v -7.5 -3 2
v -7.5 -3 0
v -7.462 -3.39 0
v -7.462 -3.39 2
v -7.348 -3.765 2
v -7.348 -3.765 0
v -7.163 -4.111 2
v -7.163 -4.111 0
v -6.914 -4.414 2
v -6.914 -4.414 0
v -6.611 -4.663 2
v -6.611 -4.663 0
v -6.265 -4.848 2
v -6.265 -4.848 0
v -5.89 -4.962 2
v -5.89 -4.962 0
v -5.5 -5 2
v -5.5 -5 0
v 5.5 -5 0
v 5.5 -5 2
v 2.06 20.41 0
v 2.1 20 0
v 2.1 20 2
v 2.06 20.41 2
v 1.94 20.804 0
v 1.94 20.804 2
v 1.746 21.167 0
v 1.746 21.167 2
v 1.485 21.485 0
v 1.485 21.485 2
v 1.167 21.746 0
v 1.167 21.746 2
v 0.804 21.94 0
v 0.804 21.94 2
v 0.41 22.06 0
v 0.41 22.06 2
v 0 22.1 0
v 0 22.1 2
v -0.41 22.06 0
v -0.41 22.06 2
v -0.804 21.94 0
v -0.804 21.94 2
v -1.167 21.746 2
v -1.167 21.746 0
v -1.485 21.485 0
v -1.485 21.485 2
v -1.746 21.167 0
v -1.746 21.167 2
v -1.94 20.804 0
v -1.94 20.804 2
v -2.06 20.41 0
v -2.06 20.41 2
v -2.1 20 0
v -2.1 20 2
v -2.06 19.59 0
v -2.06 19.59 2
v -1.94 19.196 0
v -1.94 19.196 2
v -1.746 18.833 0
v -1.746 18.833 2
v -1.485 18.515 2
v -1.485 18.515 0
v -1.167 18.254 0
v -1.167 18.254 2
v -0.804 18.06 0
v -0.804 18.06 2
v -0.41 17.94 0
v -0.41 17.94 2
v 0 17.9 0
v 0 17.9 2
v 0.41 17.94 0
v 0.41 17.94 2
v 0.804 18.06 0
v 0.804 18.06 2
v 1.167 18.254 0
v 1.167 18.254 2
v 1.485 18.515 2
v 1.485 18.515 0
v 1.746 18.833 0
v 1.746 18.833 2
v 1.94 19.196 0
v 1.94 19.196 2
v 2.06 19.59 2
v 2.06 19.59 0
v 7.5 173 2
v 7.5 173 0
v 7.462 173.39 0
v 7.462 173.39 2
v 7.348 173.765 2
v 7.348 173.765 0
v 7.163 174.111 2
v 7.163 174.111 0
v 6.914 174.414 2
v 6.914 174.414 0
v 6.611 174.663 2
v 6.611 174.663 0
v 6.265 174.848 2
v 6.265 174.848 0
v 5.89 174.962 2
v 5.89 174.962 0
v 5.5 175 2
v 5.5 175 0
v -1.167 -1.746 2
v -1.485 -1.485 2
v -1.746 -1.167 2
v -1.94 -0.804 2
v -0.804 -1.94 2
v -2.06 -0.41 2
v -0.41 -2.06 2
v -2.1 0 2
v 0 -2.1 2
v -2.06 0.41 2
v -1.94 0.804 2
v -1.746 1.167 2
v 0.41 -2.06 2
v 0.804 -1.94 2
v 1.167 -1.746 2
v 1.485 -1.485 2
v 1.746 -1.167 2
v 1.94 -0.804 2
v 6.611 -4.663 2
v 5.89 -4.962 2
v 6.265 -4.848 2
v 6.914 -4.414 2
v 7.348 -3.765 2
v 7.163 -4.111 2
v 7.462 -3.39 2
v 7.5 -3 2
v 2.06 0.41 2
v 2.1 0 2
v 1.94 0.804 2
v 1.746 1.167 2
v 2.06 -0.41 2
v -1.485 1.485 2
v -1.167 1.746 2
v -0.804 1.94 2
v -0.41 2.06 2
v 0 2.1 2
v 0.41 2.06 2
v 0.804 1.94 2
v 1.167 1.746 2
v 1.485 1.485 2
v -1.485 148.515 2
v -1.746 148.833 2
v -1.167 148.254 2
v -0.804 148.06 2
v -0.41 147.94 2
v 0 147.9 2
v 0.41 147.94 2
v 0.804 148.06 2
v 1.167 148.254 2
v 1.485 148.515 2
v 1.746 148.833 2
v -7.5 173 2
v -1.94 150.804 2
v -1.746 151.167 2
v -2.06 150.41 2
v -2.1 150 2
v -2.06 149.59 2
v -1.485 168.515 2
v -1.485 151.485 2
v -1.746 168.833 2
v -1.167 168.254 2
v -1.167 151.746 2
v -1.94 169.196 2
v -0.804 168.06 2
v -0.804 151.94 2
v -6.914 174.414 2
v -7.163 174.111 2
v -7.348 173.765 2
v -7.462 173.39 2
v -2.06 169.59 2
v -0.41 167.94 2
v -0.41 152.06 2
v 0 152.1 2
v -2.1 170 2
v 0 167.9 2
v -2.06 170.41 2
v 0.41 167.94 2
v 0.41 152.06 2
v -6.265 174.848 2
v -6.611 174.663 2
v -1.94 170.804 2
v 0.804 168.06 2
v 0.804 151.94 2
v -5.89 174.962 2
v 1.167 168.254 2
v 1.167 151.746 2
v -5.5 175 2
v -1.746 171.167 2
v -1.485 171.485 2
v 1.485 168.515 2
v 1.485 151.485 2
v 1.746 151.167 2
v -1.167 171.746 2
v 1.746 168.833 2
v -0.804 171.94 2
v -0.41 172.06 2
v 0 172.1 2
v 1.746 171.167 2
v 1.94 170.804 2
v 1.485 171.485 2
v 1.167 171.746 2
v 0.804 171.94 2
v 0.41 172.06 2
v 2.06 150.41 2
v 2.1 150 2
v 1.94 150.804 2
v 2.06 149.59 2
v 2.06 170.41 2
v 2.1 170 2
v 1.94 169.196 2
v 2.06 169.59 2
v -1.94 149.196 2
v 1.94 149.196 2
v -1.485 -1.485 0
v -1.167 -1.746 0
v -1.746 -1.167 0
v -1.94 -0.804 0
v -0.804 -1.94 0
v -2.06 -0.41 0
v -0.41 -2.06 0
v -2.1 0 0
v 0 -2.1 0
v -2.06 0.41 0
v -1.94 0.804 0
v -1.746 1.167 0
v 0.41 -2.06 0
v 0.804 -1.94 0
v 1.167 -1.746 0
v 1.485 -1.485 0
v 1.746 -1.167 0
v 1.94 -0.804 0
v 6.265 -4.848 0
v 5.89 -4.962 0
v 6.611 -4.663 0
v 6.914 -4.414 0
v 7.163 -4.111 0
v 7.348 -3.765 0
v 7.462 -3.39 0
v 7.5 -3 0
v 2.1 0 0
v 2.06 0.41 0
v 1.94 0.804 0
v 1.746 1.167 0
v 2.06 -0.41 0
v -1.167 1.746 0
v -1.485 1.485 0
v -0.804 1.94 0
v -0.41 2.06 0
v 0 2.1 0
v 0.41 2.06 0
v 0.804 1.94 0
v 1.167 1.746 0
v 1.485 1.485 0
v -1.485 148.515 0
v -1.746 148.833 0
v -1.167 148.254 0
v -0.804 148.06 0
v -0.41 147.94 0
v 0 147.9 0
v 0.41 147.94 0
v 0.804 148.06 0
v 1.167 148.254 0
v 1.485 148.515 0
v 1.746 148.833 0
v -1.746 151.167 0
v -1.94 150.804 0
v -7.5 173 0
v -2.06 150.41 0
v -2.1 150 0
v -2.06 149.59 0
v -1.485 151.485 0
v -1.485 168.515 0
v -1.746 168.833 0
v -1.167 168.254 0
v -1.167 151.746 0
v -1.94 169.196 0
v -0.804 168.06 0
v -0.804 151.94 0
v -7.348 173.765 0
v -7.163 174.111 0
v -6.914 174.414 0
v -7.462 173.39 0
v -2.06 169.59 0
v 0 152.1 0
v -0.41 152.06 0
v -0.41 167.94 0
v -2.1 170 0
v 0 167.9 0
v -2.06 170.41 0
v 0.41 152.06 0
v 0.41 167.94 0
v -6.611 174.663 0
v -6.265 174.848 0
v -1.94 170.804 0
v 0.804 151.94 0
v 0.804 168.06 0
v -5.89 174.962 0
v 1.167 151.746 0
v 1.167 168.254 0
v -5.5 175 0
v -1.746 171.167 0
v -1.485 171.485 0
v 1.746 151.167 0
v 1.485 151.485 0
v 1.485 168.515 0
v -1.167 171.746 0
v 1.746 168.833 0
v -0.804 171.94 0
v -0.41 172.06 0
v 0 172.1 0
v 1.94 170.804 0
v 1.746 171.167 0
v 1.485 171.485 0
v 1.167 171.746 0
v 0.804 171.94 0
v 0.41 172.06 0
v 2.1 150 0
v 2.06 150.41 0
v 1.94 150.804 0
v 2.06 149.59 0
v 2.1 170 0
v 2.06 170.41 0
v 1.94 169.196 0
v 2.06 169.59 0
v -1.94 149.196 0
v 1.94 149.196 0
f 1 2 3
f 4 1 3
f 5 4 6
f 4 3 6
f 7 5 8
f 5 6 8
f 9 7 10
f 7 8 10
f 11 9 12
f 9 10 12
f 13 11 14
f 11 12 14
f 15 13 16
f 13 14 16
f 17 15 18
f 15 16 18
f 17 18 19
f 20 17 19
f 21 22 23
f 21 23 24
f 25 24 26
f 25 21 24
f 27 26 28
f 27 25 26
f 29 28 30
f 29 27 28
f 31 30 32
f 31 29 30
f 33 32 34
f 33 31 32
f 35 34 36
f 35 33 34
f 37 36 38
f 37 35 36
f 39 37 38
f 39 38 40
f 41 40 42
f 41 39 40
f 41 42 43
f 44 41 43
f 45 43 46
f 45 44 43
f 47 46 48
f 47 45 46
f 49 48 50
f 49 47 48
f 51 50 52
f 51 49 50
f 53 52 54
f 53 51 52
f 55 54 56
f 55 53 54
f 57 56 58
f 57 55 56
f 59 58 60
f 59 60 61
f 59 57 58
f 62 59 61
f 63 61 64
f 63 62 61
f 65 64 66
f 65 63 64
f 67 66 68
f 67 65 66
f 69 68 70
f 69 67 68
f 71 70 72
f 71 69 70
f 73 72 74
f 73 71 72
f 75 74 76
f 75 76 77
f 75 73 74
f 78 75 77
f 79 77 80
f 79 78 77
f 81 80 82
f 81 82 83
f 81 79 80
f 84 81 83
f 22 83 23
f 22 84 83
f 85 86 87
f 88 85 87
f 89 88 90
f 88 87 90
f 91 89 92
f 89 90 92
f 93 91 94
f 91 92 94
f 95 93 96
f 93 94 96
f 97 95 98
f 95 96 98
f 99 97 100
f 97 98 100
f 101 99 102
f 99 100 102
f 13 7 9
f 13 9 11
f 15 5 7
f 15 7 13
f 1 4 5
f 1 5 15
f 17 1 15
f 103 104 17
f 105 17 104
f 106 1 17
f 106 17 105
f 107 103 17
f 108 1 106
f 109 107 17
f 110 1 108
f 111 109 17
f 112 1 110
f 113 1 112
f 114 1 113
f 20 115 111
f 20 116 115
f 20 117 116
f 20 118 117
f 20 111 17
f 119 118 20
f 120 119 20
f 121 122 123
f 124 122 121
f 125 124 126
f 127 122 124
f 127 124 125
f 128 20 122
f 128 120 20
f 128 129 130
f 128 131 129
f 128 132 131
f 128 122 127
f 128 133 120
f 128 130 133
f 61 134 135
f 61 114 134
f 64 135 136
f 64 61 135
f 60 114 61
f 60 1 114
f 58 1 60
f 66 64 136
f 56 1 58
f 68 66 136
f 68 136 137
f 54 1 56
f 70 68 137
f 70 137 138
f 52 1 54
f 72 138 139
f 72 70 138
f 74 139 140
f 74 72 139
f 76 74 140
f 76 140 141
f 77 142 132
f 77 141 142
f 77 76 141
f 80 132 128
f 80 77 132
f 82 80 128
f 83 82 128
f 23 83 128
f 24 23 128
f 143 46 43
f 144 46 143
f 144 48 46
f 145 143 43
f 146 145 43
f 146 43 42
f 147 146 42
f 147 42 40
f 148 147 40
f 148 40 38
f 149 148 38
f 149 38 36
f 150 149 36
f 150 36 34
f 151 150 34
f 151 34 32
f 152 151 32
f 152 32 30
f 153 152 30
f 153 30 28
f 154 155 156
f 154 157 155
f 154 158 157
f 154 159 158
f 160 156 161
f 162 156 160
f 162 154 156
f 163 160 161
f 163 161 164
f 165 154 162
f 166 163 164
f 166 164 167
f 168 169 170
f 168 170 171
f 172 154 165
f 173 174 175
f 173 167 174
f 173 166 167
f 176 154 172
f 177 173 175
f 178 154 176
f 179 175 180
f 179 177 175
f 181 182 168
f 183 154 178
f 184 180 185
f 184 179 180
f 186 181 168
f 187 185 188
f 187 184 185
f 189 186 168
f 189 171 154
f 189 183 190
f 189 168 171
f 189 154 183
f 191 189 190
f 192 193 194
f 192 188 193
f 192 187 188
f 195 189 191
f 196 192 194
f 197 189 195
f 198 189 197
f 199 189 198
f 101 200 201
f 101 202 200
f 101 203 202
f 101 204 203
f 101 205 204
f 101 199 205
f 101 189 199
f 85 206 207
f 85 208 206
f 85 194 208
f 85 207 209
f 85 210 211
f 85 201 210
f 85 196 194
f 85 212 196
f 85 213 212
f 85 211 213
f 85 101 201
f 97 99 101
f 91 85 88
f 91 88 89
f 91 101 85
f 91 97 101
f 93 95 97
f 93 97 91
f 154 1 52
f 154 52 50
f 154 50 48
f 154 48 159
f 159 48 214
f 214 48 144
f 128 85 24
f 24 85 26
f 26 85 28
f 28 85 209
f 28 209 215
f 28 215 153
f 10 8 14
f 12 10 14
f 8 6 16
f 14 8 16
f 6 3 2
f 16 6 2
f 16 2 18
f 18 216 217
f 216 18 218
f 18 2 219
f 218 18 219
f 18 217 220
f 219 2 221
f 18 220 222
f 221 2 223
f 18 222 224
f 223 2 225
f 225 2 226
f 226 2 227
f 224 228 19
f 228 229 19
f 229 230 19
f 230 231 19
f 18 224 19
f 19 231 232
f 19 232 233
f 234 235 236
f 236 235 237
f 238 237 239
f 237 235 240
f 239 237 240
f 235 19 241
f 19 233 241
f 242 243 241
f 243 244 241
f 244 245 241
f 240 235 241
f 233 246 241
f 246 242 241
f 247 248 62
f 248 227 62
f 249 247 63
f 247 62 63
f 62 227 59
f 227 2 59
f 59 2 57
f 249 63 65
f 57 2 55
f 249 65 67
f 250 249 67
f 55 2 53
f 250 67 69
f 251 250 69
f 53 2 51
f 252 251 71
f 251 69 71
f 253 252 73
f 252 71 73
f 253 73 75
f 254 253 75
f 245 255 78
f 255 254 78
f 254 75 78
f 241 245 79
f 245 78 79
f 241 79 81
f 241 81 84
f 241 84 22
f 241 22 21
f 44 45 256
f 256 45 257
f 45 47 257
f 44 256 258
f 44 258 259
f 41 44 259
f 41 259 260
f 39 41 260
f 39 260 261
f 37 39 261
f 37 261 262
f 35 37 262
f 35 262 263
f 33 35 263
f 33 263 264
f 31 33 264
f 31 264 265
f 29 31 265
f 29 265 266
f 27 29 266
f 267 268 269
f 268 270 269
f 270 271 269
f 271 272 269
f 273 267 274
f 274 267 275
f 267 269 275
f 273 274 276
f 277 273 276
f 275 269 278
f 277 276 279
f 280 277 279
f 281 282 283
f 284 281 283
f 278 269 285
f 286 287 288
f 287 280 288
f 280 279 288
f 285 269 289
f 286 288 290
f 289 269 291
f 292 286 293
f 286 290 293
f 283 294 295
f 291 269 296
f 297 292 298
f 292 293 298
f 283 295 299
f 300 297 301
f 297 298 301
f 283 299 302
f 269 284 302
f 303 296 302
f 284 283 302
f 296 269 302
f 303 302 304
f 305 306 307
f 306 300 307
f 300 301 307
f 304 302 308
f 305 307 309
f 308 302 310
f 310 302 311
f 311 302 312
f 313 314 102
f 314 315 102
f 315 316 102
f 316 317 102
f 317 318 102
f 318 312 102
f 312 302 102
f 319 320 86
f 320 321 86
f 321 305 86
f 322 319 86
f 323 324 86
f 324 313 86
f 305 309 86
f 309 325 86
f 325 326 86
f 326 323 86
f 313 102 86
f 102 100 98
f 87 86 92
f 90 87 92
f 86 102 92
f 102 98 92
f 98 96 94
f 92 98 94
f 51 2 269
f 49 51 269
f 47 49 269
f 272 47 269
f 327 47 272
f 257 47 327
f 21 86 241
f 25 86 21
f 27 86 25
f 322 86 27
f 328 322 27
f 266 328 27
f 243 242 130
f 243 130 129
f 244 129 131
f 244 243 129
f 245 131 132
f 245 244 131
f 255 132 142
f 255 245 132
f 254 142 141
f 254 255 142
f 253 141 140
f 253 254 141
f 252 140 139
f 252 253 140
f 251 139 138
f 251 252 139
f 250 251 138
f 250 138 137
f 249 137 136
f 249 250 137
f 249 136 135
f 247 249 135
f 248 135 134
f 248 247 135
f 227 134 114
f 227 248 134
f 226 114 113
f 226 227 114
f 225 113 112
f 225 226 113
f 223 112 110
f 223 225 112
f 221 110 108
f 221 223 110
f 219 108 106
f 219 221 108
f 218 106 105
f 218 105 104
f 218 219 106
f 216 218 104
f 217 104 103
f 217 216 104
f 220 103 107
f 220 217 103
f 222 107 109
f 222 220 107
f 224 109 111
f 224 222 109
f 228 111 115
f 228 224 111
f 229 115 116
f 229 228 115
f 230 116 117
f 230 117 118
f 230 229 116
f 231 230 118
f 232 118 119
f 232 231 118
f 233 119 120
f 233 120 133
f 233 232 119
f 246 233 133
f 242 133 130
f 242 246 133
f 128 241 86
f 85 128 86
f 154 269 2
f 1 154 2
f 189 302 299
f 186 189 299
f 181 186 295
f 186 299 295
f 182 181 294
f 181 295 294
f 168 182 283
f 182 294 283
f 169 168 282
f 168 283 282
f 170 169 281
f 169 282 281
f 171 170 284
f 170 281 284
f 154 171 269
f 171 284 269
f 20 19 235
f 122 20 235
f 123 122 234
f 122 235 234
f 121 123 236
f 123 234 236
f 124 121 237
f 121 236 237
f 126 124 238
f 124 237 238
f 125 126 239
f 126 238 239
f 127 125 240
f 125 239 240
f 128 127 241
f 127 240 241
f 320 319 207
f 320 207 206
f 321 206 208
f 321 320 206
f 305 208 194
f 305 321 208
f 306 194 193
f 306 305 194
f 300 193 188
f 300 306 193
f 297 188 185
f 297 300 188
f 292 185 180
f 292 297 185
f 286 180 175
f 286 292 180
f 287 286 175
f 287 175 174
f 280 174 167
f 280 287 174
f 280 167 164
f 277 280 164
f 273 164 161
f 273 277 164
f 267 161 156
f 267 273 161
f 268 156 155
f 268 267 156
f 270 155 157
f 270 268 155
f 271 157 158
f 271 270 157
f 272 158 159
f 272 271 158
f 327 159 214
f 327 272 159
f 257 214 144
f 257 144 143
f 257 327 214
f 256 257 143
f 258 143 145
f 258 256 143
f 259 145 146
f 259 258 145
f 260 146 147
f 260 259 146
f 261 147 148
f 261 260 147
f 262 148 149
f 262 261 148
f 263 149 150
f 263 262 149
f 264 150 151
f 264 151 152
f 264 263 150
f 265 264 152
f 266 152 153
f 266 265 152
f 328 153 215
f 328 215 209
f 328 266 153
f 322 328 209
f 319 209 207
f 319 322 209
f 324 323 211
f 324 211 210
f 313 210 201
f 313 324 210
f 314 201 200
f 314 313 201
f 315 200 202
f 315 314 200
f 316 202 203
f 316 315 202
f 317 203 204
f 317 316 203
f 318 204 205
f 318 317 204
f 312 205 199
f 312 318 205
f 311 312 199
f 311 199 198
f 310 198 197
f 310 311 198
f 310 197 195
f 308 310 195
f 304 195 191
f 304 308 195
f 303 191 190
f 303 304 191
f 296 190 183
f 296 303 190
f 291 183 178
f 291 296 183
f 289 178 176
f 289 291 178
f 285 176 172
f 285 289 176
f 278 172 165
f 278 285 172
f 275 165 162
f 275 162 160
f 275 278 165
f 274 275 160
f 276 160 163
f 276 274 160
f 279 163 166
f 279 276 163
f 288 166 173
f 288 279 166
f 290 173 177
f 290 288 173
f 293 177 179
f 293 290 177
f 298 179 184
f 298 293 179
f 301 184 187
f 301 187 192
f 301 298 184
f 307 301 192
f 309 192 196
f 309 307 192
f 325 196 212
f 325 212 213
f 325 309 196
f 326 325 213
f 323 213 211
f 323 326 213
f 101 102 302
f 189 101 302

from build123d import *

# Parameters (mm, degrees)
SKETCH_1_R      = 2.1
EXTRUDE_1_DEPTH = 2


with BuildPart() as part:
    # Эскиз1 → Бобышка-Вытянуть1 (new body)
    with BuildSketch(Plane.XY):
        with BuildLine():
            Line((-7.5, 173), (-7.5, -3))
            ThreePointArc((-7.5, -3), (-6.914213562, -4.414213562), (-5.5, -5))
            Line((-5.5, -5), (5.5, -5))
            ThreePointArc((5.5, -5), (6.914213562, -4.414213562), (7.5, -3))
            Line((7.5, -3), (7.5, 173))
            ThreePointArc((7.5, 173), (6.914213562, 174.414213562), (5.5, 175))
            Line((5.5, 175), (-5.5, 175))
            ThreePointArc((-5.5, 175), (-6.914213562, 174.414213562), (-7.5, 173))
        make_face()
        with Locations((0, 170)):
            Circle(SKETCH_1_R, mode=Mode.SUBTRACT)
        with Locations((0, 150)):
            Circle(SKETCH_1_R, mode=Mode.SUBTRACT)
        with Locations((0, 20)):
            Circle(SKETCH_1_R, mode=Mode.SUBTRACT)
        Circle(SKETCH_1_R, mode=Mode.SUBTRACT)
    extrude(amount=EXTRUDE_1_DEPTH)


solid = part.part
